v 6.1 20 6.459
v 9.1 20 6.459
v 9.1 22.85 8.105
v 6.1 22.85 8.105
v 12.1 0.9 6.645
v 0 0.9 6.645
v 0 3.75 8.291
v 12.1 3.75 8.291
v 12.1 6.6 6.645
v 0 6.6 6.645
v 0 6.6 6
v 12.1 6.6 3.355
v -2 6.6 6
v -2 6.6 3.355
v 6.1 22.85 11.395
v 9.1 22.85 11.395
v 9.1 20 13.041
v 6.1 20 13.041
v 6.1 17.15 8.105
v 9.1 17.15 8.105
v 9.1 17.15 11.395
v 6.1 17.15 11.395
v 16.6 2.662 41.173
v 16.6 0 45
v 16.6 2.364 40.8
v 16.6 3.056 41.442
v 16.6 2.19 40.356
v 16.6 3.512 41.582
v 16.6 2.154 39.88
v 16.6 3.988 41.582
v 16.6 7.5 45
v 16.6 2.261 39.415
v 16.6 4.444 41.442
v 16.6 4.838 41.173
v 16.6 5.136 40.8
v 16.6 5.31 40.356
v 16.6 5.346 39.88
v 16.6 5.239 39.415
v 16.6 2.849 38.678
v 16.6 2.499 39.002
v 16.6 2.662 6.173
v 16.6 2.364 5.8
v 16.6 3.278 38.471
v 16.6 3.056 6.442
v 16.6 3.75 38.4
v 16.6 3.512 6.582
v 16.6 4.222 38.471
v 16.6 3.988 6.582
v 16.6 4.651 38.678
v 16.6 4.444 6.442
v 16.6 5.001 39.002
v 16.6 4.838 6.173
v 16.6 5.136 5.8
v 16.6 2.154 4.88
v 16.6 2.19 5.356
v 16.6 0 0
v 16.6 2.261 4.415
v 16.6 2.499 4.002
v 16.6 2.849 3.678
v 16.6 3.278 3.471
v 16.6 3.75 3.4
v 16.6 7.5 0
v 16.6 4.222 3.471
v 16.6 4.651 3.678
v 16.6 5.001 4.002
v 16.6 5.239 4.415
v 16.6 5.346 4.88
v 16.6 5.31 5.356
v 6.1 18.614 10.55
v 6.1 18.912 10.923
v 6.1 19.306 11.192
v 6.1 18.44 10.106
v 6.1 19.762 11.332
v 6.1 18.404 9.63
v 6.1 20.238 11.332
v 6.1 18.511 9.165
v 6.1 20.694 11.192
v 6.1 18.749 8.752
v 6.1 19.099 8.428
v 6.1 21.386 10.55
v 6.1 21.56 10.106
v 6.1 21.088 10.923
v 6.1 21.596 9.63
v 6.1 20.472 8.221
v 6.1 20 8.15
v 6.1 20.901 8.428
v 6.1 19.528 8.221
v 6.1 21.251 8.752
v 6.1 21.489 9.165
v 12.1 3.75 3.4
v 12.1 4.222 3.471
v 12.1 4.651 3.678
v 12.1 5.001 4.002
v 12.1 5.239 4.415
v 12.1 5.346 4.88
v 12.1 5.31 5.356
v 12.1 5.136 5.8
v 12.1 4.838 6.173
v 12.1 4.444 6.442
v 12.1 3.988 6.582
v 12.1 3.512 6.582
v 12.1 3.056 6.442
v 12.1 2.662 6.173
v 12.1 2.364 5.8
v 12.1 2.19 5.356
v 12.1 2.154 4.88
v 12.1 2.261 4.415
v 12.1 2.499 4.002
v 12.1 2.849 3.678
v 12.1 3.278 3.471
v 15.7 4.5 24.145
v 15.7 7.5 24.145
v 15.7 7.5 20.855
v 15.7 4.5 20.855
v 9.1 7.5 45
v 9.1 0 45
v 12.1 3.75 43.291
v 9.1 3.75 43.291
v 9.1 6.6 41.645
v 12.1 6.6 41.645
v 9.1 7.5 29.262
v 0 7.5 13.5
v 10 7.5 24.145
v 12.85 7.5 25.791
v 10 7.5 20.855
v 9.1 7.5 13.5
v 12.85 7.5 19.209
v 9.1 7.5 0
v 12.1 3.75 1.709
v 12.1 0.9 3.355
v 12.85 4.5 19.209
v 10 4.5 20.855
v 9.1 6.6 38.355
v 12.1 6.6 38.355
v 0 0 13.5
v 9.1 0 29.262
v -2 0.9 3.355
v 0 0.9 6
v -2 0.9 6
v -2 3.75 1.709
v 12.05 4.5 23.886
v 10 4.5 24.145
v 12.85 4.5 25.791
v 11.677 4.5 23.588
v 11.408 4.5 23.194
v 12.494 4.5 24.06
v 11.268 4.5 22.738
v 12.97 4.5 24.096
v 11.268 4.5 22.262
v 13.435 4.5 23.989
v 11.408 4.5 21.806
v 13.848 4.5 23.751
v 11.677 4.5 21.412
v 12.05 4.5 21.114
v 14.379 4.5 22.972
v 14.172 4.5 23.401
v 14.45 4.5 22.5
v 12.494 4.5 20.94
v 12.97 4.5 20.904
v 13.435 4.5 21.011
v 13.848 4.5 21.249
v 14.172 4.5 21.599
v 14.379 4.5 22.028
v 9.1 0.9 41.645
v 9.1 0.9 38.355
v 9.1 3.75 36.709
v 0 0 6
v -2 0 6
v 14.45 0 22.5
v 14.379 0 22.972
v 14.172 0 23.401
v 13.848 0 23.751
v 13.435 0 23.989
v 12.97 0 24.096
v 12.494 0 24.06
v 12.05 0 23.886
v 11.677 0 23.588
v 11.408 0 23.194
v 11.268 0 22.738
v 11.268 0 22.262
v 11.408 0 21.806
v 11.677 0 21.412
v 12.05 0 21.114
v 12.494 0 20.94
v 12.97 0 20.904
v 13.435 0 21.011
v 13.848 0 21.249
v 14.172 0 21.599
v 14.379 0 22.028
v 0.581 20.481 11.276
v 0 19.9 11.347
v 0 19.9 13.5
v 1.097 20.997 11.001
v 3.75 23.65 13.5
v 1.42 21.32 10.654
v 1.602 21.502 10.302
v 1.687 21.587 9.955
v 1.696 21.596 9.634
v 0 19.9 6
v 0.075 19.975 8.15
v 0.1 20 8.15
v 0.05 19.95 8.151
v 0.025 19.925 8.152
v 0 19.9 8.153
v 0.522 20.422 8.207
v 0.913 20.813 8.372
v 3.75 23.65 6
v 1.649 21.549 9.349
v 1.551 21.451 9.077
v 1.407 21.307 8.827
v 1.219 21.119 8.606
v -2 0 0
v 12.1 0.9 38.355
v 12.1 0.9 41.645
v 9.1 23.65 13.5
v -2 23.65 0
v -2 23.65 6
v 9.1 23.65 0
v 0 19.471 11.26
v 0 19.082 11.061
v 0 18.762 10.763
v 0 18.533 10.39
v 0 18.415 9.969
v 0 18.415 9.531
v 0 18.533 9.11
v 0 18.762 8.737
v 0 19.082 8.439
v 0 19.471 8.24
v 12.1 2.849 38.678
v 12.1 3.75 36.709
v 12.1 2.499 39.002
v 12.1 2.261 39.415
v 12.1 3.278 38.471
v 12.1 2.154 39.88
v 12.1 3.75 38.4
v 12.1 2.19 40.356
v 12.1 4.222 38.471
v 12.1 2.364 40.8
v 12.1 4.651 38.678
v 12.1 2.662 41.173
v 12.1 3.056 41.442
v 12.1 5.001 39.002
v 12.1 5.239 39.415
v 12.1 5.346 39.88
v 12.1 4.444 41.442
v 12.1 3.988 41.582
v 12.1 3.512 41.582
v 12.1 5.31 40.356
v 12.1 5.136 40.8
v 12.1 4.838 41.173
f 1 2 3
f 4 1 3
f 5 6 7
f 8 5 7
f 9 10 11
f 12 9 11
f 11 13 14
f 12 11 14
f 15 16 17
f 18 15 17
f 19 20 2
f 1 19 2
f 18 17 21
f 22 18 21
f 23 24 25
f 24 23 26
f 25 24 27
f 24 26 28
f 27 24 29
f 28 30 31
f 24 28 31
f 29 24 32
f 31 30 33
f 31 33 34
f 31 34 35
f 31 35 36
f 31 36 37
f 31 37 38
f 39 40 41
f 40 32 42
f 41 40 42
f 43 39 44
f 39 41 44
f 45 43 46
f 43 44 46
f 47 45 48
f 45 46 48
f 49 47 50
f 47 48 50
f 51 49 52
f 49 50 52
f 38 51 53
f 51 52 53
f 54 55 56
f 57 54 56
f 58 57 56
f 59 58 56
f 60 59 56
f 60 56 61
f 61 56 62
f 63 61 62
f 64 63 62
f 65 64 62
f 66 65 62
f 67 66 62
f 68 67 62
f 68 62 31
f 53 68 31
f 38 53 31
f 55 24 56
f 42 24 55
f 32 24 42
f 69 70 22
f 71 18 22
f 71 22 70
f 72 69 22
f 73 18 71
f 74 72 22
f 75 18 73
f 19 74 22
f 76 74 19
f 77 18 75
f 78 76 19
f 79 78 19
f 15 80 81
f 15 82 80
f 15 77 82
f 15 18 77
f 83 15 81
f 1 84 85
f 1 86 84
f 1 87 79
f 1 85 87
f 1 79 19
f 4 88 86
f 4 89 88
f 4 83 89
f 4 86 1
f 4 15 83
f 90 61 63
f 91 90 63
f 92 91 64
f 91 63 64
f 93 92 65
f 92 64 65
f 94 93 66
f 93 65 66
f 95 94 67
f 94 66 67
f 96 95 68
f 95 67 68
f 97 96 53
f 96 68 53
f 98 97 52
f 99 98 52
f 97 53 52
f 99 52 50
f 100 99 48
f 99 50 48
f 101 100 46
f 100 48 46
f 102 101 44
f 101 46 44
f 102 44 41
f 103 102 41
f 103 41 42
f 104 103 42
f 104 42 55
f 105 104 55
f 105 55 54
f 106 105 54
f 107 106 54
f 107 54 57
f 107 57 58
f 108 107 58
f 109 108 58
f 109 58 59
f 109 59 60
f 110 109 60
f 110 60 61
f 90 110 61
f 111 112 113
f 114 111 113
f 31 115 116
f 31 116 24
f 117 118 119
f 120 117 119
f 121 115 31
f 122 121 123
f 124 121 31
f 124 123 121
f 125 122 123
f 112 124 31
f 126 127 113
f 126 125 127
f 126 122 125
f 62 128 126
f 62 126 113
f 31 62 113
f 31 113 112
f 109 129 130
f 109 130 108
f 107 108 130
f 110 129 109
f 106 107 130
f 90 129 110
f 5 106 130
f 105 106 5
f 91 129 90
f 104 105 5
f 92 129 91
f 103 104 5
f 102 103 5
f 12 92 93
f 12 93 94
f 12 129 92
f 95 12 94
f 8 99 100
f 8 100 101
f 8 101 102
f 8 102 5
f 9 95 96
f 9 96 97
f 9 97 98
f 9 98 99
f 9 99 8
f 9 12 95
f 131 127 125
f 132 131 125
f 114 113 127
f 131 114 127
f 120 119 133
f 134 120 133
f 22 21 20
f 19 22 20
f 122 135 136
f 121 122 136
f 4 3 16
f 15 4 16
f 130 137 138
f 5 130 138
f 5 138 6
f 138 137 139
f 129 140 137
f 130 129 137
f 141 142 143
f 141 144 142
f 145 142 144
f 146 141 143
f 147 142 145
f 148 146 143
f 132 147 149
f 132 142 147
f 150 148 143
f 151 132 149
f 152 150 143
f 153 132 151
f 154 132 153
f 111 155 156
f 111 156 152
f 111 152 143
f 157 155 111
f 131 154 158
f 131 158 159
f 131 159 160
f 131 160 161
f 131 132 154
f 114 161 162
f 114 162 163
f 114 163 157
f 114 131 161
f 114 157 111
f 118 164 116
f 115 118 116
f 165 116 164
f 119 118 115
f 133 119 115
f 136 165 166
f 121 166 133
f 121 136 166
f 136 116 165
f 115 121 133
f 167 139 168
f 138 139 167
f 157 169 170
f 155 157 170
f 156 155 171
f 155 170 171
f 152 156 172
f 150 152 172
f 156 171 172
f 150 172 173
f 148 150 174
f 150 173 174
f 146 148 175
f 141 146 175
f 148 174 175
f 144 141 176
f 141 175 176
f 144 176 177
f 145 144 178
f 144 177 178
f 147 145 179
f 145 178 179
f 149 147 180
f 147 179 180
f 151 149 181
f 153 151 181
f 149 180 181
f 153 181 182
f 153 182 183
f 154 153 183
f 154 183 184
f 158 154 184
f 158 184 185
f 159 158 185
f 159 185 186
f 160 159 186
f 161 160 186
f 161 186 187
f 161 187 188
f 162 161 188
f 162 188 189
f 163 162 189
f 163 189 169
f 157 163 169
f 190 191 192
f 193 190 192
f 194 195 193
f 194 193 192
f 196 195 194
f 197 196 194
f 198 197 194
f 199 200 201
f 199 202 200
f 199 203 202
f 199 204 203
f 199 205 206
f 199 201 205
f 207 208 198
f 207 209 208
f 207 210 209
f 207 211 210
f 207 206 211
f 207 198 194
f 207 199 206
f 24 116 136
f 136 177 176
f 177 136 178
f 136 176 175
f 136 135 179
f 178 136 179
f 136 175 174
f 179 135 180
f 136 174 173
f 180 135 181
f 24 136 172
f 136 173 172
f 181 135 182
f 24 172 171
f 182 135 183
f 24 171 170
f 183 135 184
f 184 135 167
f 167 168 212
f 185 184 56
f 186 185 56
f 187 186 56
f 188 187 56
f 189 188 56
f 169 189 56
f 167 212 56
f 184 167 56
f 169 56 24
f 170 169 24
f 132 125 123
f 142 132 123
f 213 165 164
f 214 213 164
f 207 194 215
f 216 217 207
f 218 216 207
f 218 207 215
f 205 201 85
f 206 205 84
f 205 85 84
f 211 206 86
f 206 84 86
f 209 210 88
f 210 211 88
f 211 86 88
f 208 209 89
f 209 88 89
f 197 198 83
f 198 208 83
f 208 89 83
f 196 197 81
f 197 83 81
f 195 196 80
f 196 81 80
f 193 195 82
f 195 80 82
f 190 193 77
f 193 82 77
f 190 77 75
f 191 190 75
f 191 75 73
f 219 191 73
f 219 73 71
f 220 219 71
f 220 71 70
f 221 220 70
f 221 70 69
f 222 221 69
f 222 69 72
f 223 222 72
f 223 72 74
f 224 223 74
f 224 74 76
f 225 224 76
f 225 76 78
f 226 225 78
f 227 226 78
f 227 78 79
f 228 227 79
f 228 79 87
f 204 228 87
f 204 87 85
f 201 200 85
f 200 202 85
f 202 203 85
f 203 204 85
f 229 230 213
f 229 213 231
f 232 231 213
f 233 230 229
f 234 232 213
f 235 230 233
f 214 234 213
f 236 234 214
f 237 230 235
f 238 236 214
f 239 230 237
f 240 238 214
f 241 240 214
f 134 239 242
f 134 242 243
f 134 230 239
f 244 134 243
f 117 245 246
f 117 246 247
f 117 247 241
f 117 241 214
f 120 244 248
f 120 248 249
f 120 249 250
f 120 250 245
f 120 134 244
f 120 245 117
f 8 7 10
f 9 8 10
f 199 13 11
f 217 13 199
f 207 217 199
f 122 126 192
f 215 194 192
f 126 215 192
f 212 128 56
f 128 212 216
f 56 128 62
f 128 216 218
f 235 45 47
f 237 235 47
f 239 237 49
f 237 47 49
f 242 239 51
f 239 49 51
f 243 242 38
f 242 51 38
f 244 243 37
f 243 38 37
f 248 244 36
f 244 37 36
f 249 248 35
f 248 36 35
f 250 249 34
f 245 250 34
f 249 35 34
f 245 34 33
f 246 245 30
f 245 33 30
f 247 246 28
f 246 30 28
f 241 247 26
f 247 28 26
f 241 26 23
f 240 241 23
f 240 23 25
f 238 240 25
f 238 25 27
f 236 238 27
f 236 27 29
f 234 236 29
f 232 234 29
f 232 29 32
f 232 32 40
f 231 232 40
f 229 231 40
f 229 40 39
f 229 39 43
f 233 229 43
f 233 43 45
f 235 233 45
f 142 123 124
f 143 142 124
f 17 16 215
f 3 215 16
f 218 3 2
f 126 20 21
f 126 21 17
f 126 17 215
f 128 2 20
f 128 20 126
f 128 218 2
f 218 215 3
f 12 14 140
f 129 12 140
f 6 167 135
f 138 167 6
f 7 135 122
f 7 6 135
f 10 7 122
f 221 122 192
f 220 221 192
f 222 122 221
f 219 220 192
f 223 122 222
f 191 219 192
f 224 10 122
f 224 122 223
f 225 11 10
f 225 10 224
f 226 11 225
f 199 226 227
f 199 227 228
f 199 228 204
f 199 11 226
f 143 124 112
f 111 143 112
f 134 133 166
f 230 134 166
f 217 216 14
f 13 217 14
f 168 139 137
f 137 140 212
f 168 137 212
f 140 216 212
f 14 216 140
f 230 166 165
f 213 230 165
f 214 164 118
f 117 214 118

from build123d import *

# Parameters (mm, degrees)
SALIENTE_EXTRUIR1_DEPTH = 6
SALIENTE_EXTRUIR2_DEPTH = 7.5
SALIENTE_EXTRUIR3_DEPTH = 7.5
CROQUIS4_W              = 7.5
CROQUIS4_H              = 7.5
SALIENTE_EXTRUIR4_DEPTH = 31.5
CORTAR_EXTRUIR1_REACH   = 20.6
CROQUIS5_R              = 1.6
CORTAR_EXTRUIR2_DEPTH   = 14.1
CORTAR_EXTRUIR3_DEPTH   = 3
CORTAR_EXTRUIR4_REACH   = 25.65
CROQUIS8_R              = 1.6
CORTAR_EXTRUIR5_DEPTH   = 3
CORTAR_EXTRUIR6_REACH   = 13.1
CROQUIS10_R             = 1.6
CORTAR_EXTRUIR7_DEPTH   = 3


with BuildPart() as part:
    # Croquis1 → Saliente-Extruir1 (new body)
    with BuildSketch(Plane.XY):
        Polygon((0, 0), (16.6, 0), (16.6, 7.5), (9.1, 7.5), (9.1, 23.65), (3.75, 23.65), (-2, 23.65), (-2, 0), align=None)
    extrude(amount=SALIENTE_EXTRUIR1_DEPTH)

    # Croquis2 → Saliente-Extruir2 (add)
    with BuildSketch(Plane.XY.offset(6)):
        Polygon((0, 0), (0, 19.9), (3.75, 23.65), (9.1, 23.65), (9.1, 7.5), (16.6, 7.5), (16.6, 0), align=None)
    extrude(amount=SALIENTE_EXTRUIR2_DEPTH)

    # Croquis3 → Saliente-Extruir3 (add)
    with BuildSketch(Plane.XZ):
        Polygon((0, 13.5), (9.1, 29.261662349), (9.1, 13.5), align=None)
    extrude(amount=-SALIENTE_EXTRUIR3_DEPTH)

    # Croquis4 → Saliente-Extruir4 (add)
    with BuildSketch(Plane.XY.offset(13.5)):
        with Locations((12.85, 3.75)):
            Rectangle(CROQUIS4_W, CROQUIS4_H)
    extrude(amount=SALIENTE_EXTRUIR4_DEPTH)

    # Croquis5 → Cortar-Extruir1 (cut, up to next)
    with BuildSketch(Plane(origin=(16.6, 0, 0), x_dir=(0, 0, -1), z_dir=(1, 0, 0)), mode=Mode.PRIVATE) as cortar_extruir1_sk1:
        with Locations((-5, 3.75)):
            Circle(CROQUIS5_R)
    cortar_extruir1_tool1 = extrude(cortar_extruir1_sk1.sketch, amount=-CORTAR_EXTRUIR1_REACH, mode=Mode.PRIVATE) & part.part
    add(cortar_extruir1_tool1.solids().sort_by_distance((16.6, 3.75, 5))[0], mode=Mode.SUBTRACT)
    # Croquis5 → Cortar-Extruir1 (cut, up to next)
    with BuildSketch(Plane(origin=(16.6, 0, 0), x_dir=(0, 0, -1), z_dir=(1, 0, 0)), mode=Mode.PRIVATE) as cortar_extruir1_sk2:
        with Locations((-40, 3.75)):
            Circle(CROQUIS5_R)
    cortar_extruir1_tool2 = extrude(cortar_extruir1_sk2.sketch, amount=-CORTAR_EXTRUIR1_REACH, mode=Mode.PRIVATE) & part.part
    add(cortar_extruir1_tool2.solids().sort_by_distance((16.6, 3.75, 40))[0], mode=Mode.SUBTRACT)

    # Croquis6 → Cortar-Extruir2 (cut)
    with BuildSketch(Plane.ZY.offset(2)):
        Polygon((3.354551733, 0.9), (6.645448267, 0.9), (8.290896534, 3.75), (6.645448267, 6.6), (3.354551733, 6.6), (1.709103466, 3.75), align=None)
    extrude(amount=-CORTAR_EXTRUIR2_DEPTH, mode=Mode.SUBTRACT)

    # Croquis7 → Cortar-Extruir3 (cut)
    with BuildSketch(Plane.ZY.offset(-9.1)):
        Polygon((38.354551733, 0.9), (41.645448267, 0.9), (43.290896534, 3.75), (41.645448267, 6.6), (38.354551733, 6.6), (36.709103466, 3.75), align=None)
    extrude(amount=-CORTAR_EXTRUIR3_DEPTH, mode=Mode.SUBTRACT)

    # Croquis8 → Cortar-Extruir4 (cut, up to next)
    with BuildSketch(Plane.XZ, mode=Mode.PRIVATE) as cortar_extruir4_sk1:
        with Locations((12.85, 22.5)):
            Circle(CROQUIS8_R)
    cortar_extruir4_tool1 = extrude(cortar_extruir4_sk1.sketch, amount=-CORTAR_EXTRUIR4_REACH, mode=Mode.PRIVATE) & part.part
    add(cortar_extruir4_tool1.solids().sort_by_distance((12.85, 0, 22.5))[0], mode=Mode.SUBTRACT)

    # Croquis9 → Cortar-Extruir5 (cut)
    with BuildSketch(Plane(origin=(0, 7.5, 0), x_dir=(1, 0, 0), z_dir=(0, 1, 0))):
        Polygon((15.7, -20.854551733), (12.85, -19.209103466), (10, -20.854551733), (10, -24.145448267), (12.85, -25.790896534), (15.7, -24.145448267), align=None)
    extrude(amount=-CORTAR_EXTRUIR5_DEPTH, mode=Mode.SUBTRACT)

    # Croquis10 → Cortar-Extruir6 (cut, up to next)
    with BuildSketch(Plane(origin=(9.1, 0, 0), x_dir=(0, 0, -1), z_dir=(1, 0, 0)), mode=Mode.PRIVATE) as cortar_extruir6_sk1:
        with Locations((-9.75, 20)):
            Circle(CROQUIS10_R)
    cortar_extruir6_tool1 = extrude(cortar_extruir6_sk1.sketch, amount=-CORTAR_EXTRUIR6_REACH, mode=Mode.PRIVATE) & part.part
    add(cortar_extruir6_tool1.solids().sort_by_distance((9.1, 20, 9.75))[0], mode=Mode.SUBTRACT)

    # Croquis11 → Cortar-Extruir7 (cut)
    with BuildSketch(Plane(origin=(9.1, 0, 0), x_dir=(0, 0, -1), z_dir=(1, 0, 0))):
        Polygon((-8.104551733, 22.85), (-11.395448267, 22.85), (-13.040896534, 20), (-11.395448267, 17.15), (-8.104551733, 17.15), (-6.459103466, 20), align=None)
    extrude(amount=-CORTAR_EXTRUIR7_DEPTH, mode=Mode.SUBTRACT)


solid = part.part
